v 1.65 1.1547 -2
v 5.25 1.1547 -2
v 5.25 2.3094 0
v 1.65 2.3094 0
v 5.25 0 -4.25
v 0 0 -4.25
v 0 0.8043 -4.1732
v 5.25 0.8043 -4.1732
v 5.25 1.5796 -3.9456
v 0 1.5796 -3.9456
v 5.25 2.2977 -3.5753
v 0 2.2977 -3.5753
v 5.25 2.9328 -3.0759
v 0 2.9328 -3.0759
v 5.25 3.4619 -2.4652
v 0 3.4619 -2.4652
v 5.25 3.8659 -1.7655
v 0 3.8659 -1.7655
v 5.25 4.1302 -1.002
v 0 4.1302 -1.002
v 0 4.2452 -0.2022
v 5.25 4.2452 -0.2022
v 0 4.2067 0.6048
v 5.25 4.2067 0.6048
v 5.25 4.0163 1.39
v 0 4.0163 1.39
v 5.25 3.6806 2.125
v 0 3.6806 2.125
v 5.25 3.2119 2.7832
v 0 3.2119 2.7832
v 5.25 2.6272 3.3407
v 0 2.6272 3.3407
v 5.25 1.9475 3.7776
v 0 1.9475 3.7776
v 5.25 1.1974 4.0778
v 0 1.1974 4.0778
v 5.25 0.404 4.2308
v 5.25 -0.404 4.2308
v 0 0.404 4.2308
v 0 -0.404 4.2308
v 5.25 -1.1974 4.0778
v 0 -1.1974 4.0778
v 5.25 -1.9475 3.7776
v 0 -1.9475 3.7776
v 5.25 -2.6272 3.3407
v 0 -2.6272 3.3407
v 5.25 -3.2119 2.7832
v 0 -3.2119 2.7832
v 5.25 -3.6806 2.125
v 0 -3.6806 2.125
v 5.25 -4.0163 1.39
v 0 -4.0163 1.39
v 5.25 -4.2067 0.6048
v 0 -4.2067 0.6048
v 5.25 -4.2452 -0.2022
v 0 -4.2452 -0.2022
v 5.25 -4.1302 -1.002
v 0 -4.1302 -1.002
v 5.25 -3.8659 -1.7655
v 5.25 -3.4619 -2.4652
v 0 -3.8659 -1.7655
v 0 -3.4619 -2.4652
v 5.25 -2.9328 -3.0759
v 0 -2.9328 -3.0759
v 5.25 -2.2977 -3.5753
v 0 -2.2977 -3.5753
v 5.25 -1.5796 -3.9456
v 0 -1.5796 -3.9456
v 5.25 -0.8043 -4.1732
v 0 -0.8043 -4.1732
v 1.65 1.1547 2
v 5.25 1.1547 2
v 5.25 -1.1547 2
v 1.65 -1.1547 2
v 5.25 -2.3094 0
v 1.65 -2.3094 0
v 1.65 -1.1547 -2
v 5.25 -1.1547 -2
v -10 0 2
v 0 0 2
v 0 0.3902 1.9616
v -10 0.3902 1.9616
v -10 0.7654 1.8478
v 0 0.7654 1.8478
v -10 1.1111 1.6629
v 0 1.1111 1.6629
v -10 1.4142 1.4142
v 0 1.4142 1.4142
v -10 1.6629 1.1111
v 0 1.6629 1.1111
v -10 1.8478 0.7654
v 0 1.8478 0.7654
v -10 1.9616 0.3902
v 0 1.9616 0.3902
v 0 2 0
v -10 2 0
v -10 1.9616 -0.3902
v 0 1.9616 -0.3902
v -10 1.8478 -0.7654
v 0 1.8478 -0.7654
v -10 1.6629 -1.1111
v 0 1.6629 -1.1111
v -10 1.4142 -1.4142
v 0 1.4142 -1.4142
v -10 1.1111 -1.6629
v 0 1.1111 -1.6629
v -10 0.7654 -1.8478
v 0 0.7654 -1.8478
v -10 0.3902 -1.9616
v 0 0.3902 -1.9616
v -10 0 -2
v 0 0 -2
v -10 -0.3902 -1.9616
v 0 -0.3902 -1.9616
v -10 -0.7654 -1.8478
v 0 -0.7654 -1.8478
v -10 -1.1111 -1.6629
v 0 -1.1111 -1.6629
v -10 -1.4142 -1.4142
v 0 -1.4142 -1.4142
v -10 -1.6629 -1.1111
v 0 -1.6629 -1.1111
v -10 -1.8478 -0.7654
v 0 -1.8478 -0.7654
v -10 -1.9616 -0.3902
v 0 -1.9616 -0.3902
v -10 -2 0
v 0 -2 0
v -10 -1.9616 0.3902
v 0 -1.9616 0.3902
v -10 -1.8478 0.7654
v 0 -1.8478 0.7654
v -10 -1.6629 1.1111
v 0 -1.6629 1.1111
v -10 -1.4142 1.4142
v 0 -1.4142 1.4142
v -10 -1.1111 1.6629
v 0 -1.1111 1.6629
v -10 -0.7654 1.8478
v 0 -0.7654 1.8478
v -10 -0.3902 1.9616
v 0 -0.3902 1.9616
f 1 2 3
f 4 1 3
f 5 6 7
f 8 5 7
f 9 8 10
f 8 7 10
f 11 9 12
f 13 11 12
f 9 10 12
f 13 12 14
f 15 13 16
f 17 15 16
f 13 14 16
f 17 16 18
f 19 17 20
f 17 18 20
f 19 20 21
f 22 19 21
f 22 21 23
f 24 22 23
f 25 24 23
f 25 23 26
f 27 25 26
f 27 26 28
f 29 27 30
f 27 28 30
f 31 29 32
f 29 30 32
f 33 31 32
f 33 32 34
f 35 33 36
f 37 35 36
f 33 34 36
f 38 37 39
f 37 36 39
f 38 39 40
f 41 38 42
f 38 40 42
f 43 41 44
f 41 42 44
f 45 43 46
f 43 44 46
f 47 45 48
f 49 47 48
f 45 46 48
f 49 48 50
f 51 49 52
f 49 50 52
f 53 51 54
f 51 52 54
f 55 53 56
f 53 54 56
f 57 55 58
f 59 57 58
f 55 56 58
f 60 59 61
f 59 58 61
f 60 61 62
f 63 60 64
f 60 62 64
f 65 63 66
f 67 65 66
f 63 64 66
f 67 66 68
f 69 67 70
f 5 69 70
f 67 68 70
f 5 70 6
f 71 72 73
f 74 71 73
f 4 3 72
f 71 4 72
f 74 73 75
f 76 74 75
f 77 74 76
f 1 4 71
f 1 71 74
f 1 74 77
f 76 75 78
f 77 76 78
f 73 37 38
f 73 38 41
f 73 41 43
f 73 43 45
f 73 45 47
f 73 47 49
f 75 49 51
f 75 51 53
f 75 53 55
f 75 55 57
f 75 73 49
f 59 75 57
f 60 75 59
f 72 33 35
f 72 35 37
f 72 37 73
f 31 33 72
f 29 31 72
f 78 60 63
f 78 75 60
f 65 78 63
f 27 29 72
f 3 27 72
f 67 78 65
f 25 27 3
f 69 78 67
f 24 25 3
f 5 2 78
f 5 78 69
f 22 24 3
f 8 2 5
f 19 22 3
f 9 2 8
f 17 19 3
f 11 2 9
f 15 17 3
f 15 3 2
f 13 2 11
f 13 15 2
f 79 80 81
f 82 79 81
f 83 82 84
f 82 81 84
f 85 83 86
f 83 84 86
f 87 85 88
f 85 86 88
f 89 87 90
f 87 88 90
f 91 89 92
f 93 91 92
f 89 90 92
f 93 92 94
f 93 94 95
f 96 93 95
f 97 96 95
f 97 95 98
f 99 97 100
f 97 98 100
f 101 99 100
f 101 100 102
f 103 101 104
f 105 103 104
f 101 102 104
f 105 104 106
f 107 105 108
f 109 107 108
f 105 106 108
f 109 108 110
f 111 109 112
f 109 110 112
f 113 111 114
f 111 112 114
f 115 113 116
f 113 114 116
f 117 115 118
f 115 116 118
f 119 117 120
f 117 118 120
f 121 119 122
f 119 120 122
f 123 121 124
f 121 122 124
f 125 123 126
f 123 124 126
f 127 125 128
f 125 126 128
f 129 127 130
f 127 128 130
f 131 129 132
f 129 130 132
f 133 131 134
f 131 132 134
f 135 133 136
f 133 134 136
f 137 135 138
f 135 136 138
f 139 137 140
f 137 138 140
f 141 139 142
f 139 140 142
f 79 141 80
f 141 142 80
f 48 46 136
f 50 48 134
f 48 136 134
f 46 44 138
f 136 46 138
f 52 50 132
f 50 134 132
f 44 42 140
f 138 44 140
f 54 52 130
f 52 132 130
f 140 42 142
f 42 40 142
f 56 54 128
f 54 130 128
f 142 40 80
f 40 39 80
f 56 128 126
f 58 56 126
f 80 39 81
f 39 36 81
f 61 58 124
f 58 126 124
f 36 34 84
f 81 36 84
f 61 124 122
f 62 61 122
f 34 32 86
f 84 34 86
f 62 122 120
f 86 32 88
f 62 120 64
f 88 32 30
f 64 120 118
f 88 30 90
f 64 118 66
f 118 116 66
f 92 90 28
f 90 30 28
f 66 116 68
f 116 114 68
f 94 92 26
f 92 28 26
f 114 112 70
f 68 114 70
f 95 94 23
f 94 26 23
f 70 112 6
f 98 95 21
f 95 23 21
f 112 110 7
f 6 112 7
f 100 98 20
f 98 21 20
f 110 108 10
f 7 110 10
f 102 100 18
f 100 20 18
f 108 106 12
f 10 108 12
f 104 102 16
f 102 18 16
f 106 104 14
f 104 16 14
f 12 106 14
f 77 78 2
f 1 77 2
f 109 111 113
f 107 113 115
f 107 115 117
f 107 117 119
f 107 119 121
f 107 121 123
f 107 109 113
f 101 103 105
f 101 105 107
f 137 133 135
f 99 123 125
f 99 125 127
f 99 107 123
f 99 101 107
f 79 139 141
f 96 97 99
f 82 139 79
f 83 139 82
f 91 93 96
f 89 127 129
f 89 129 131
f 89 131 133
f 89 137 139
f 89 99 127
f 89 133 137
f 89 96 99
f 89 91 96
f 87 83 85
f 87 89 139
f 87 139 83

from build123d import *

# Parameters (mm, degrees)
SKETCH1_R           = 4.25
BOSS_EXTRUDE1_DEPTH = 5.25
CUT_EXTRUDE1_DEPTH  = 3.6
SKETCH3_R           = 2
BOSS_EXTRUDE2_DEPTH = 10


with BuildPart() as part:
    # Sketch1 → Boss-Extrude1 (new body)
    with BuildSketch(Plane(origin=(0, 0, 0), x_dir=(0, 0, -1), z_dir=(1, 0, 0))):
        Circle(SKETCH1_R)
    extrude(amount=BOSS_EXTRUDE1_DEPTH)

    # Sketch2 → Cut-Extrude1 (cut)
    with BuildSketch(Plane(origin=(5.25, 0, 0), x_dir=(0, 0, -1), z_dir=(1, 0, 0))):
        Polygon((0, 2.309401077), (-2, 1.154700538), (-2, -1.154700538), (0, -2.309401077), (2, -1.154700538), (2, 1.154700538), align=None)
    extrude(amount=-CUT_EXTRUDE1_DEPTH, mode=Mode.SUBTRACT)

    # Sketch3 → Boss-Extrude2 (add)
    with BuildSketch(Plane.ZY):
        Circle(SKETCH3_R)
    extrude(amount=BOSS_EXTRUDE2_DEPTH)


solid = part.part
